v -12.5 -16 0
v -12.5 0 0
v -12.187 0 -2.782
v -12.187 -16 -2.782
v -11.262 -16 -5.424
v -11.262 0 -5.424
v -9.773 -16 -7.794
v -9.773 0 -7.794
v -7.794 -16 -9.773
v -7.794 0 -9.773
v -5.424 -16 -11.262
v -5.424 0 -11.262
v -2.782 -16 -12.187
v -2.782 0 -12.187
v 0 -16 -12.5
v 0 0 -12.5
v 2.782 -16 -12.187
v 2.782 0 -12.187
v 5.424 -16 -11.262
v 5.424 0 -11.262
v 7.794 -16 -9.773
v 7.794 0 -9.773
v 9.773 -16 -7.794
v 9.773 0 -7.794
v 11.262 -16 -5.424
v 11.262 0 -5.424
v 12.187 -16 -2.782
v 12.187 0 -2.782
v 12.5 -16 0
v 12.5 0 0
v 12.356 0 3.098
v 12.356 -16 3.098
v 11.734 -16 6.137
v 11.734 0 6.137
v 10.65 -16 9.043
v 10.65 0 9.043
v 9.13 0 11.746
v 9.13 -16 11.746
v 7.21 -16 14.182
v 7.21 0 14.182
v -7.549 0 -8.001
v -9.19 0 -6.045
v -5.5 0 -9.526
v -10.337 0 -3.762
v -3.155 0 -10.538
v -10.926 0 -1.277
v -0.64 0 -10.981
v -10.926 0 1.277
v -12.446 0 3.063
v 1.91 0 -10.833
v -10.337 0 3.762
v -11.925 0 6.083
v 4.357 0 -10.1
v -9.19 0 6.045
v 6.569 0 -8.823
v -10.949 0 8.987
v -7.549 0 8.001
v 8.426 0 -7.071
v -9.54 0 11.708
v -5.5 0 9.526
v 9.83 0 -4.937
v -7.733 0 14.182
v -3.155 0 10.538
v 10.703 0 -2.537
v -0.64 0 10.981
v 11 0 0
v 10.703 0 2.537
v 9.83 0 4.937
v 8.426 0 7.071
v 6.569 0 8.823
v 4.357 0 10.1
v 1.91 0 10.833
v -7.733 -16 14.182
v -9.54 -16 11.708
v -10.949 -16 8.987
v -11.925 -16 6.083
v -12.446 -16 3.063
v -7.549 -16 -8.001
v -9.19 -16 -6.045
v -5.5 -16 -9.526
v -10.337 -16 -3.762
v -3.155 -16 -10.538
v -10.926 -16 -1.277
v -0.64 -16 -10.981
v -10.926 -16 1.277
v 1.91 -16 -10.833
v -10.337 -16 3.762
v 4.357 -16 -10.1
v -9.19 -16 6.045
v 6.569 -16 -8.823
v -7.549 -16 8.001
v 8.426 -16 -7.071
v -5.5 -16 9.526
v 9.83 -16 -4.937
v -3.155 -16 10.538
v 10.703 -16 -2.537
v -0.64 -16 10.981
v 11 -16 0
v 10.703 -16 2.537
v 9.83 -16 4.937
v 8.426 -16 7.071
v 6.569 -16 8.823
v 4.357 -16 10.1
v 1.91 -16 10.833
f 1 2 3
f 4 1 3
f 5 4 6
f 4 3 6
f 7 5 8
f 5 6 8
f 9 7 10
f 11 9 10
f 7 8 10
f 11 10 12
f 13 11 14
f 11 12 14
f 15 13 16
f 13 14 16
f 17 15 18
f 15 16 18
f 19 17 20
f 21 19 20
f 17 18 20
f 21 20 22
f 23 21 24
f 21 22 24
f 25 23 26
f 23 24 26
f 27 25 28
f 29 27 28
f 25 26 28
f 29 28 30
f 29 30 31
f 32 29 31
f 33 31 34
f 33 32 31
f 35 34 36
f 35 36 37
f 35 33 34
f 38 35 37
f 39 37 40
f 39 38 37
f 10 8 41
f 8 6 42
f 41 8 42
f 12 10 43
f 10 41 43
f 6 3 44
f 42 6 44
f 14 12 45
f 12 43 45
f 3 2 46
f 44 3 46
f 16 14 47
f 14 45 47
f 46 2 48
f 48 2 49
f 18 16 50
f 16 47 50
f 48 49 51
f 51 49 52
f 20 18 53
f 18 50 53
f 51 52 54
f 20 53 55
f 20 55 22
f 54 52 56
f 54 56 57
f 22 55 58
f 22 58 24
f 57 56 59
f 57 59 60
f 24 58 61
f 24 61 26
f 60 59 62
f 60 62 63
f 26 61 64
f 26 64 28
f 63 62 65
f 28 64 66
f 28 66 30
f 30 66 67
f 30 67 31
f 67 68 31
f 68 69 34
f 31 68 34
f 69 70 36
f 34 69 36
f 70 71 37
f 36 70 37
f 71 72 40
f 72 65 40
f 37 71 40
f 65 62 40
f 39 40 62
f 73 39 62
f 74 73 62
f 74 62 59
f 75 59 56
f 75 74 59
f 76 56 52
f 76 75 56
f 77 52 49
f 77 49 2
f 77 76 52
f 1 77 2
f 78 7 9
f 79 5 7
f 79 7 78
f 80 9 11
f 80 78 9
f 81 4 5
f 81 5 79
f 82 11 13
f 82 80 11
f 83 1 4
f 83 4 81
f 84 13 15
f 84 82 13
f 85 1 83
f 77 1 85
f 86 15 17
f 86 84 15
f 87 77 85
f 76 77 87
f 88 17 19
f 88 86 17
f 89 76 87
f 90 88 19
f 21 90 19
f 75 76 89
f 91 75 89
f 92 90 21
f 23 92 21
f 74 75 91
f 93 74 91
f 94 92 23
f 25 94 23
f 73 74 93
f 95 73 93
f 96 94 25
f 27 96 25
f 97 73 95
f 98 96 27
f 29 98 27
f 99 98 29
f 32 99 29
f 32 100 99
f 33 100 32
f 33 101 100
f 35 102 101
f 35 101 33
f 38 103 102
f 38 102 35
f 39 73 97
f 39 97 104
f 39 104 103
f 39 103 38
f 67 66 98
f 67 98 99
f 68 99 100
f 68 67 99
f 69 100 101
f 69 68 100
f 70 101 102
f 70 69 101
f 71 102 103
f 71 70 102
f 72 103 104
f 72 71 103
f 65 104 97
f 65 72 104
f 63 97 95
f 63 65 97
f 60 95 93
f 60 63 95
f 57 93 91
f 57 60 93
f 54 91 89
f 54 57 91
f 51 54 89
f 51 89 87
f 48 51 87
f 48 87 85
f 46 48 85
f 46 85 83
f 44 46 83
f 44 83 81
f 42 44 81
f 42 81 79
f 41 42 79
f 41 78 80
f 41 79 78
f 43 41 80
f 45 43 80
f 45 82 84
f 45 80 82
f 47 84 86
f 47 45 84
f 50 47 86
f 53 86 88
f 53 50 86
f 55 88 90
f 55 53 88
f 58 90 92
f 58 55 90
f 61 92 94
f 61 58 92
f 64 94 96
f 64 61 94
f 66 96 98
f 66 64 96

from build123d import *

# Parameters (mm, degrees)
F0_R     = 12.5
F0_R_2   = 11
F1_DEPTH = 16
F3_DEPTH = 16
F4_DEPTH = 26
F6_DEPTH = 16


# Not quite as in the source:
# - a feature of the source that left no trace in its solid (it failed there, or was rolled back) is left out
# - a feature names something its author has since deleted; it is built from what else it names


with BuildPart() as f1:
    # F0 (on Front) → F1 (new body)
    with BuildSketch(Plane.XZ):
        Circle(F0_R)
        Circle(F0_R_2, mode=Mode.SUBTRACT)
    extrude(amount=F1_DEPTH)

    # F2 (on Front) → F3 (join)
    with BuildSketch(Plane.XZ):
        with BuildLine():
            Line((7.2098509409, 14.1820398122), (-7.7328206971, 14.1820398122))
            Line((-7.7328206971, 14.1820398122), (-7.7328206971, 9.7571304068))
            ThreePointArc((-7.7328206971, 9.7571304068), (0.3692249529, -12.210413225), (7.2098509409, 10.1820398122))
            Line((7.2098509409, 10.1820398122), (7.2098509409, 14.1820398122))
        make_face()
    extrude(amount=F3_DEPTH)

    # F0 (on Front) → F4 (cut)
    with BuildSketch(Plane.XZ):
        Circle(F0_R_2)
    extrude(amount=F4_DEPTH, mode=Mode.SUBTRACT)

    # F5 (on face) → F6 (join)
    with BuildSketch(Plane.XZ.offset(16)):
        with BuildLine():
            ThreePointArc((-7.7328206971, 14.1820398122), (-11.492539371, 7.5535946754), (-12.5, 0))
            ThreePointArc((-12.5, 0), (-11.2452269589, 5.4584677926), (-7.7328206971, 9.8210734681))
            Line((-7.7328206971, 9.8210734681), (-7.7328206971, 14.1820398122))
        make_face()
        with BuildLine():
            ThreePointArc((7.2098509409, 10.2111727735), (11.0989444715, 5.7500810098), (12.5, 0))
            ThreePointArc((12.5, 0), (11.2484098162, 7.6108139553), (7.2098509409, 14.1820398122))
            Line((7.2098509409, 14.1820398122), (7.2098509409, 10.2111727735))
        make_face()
    extrude(amount=-F6_DEPTH)


solid = f1.part
